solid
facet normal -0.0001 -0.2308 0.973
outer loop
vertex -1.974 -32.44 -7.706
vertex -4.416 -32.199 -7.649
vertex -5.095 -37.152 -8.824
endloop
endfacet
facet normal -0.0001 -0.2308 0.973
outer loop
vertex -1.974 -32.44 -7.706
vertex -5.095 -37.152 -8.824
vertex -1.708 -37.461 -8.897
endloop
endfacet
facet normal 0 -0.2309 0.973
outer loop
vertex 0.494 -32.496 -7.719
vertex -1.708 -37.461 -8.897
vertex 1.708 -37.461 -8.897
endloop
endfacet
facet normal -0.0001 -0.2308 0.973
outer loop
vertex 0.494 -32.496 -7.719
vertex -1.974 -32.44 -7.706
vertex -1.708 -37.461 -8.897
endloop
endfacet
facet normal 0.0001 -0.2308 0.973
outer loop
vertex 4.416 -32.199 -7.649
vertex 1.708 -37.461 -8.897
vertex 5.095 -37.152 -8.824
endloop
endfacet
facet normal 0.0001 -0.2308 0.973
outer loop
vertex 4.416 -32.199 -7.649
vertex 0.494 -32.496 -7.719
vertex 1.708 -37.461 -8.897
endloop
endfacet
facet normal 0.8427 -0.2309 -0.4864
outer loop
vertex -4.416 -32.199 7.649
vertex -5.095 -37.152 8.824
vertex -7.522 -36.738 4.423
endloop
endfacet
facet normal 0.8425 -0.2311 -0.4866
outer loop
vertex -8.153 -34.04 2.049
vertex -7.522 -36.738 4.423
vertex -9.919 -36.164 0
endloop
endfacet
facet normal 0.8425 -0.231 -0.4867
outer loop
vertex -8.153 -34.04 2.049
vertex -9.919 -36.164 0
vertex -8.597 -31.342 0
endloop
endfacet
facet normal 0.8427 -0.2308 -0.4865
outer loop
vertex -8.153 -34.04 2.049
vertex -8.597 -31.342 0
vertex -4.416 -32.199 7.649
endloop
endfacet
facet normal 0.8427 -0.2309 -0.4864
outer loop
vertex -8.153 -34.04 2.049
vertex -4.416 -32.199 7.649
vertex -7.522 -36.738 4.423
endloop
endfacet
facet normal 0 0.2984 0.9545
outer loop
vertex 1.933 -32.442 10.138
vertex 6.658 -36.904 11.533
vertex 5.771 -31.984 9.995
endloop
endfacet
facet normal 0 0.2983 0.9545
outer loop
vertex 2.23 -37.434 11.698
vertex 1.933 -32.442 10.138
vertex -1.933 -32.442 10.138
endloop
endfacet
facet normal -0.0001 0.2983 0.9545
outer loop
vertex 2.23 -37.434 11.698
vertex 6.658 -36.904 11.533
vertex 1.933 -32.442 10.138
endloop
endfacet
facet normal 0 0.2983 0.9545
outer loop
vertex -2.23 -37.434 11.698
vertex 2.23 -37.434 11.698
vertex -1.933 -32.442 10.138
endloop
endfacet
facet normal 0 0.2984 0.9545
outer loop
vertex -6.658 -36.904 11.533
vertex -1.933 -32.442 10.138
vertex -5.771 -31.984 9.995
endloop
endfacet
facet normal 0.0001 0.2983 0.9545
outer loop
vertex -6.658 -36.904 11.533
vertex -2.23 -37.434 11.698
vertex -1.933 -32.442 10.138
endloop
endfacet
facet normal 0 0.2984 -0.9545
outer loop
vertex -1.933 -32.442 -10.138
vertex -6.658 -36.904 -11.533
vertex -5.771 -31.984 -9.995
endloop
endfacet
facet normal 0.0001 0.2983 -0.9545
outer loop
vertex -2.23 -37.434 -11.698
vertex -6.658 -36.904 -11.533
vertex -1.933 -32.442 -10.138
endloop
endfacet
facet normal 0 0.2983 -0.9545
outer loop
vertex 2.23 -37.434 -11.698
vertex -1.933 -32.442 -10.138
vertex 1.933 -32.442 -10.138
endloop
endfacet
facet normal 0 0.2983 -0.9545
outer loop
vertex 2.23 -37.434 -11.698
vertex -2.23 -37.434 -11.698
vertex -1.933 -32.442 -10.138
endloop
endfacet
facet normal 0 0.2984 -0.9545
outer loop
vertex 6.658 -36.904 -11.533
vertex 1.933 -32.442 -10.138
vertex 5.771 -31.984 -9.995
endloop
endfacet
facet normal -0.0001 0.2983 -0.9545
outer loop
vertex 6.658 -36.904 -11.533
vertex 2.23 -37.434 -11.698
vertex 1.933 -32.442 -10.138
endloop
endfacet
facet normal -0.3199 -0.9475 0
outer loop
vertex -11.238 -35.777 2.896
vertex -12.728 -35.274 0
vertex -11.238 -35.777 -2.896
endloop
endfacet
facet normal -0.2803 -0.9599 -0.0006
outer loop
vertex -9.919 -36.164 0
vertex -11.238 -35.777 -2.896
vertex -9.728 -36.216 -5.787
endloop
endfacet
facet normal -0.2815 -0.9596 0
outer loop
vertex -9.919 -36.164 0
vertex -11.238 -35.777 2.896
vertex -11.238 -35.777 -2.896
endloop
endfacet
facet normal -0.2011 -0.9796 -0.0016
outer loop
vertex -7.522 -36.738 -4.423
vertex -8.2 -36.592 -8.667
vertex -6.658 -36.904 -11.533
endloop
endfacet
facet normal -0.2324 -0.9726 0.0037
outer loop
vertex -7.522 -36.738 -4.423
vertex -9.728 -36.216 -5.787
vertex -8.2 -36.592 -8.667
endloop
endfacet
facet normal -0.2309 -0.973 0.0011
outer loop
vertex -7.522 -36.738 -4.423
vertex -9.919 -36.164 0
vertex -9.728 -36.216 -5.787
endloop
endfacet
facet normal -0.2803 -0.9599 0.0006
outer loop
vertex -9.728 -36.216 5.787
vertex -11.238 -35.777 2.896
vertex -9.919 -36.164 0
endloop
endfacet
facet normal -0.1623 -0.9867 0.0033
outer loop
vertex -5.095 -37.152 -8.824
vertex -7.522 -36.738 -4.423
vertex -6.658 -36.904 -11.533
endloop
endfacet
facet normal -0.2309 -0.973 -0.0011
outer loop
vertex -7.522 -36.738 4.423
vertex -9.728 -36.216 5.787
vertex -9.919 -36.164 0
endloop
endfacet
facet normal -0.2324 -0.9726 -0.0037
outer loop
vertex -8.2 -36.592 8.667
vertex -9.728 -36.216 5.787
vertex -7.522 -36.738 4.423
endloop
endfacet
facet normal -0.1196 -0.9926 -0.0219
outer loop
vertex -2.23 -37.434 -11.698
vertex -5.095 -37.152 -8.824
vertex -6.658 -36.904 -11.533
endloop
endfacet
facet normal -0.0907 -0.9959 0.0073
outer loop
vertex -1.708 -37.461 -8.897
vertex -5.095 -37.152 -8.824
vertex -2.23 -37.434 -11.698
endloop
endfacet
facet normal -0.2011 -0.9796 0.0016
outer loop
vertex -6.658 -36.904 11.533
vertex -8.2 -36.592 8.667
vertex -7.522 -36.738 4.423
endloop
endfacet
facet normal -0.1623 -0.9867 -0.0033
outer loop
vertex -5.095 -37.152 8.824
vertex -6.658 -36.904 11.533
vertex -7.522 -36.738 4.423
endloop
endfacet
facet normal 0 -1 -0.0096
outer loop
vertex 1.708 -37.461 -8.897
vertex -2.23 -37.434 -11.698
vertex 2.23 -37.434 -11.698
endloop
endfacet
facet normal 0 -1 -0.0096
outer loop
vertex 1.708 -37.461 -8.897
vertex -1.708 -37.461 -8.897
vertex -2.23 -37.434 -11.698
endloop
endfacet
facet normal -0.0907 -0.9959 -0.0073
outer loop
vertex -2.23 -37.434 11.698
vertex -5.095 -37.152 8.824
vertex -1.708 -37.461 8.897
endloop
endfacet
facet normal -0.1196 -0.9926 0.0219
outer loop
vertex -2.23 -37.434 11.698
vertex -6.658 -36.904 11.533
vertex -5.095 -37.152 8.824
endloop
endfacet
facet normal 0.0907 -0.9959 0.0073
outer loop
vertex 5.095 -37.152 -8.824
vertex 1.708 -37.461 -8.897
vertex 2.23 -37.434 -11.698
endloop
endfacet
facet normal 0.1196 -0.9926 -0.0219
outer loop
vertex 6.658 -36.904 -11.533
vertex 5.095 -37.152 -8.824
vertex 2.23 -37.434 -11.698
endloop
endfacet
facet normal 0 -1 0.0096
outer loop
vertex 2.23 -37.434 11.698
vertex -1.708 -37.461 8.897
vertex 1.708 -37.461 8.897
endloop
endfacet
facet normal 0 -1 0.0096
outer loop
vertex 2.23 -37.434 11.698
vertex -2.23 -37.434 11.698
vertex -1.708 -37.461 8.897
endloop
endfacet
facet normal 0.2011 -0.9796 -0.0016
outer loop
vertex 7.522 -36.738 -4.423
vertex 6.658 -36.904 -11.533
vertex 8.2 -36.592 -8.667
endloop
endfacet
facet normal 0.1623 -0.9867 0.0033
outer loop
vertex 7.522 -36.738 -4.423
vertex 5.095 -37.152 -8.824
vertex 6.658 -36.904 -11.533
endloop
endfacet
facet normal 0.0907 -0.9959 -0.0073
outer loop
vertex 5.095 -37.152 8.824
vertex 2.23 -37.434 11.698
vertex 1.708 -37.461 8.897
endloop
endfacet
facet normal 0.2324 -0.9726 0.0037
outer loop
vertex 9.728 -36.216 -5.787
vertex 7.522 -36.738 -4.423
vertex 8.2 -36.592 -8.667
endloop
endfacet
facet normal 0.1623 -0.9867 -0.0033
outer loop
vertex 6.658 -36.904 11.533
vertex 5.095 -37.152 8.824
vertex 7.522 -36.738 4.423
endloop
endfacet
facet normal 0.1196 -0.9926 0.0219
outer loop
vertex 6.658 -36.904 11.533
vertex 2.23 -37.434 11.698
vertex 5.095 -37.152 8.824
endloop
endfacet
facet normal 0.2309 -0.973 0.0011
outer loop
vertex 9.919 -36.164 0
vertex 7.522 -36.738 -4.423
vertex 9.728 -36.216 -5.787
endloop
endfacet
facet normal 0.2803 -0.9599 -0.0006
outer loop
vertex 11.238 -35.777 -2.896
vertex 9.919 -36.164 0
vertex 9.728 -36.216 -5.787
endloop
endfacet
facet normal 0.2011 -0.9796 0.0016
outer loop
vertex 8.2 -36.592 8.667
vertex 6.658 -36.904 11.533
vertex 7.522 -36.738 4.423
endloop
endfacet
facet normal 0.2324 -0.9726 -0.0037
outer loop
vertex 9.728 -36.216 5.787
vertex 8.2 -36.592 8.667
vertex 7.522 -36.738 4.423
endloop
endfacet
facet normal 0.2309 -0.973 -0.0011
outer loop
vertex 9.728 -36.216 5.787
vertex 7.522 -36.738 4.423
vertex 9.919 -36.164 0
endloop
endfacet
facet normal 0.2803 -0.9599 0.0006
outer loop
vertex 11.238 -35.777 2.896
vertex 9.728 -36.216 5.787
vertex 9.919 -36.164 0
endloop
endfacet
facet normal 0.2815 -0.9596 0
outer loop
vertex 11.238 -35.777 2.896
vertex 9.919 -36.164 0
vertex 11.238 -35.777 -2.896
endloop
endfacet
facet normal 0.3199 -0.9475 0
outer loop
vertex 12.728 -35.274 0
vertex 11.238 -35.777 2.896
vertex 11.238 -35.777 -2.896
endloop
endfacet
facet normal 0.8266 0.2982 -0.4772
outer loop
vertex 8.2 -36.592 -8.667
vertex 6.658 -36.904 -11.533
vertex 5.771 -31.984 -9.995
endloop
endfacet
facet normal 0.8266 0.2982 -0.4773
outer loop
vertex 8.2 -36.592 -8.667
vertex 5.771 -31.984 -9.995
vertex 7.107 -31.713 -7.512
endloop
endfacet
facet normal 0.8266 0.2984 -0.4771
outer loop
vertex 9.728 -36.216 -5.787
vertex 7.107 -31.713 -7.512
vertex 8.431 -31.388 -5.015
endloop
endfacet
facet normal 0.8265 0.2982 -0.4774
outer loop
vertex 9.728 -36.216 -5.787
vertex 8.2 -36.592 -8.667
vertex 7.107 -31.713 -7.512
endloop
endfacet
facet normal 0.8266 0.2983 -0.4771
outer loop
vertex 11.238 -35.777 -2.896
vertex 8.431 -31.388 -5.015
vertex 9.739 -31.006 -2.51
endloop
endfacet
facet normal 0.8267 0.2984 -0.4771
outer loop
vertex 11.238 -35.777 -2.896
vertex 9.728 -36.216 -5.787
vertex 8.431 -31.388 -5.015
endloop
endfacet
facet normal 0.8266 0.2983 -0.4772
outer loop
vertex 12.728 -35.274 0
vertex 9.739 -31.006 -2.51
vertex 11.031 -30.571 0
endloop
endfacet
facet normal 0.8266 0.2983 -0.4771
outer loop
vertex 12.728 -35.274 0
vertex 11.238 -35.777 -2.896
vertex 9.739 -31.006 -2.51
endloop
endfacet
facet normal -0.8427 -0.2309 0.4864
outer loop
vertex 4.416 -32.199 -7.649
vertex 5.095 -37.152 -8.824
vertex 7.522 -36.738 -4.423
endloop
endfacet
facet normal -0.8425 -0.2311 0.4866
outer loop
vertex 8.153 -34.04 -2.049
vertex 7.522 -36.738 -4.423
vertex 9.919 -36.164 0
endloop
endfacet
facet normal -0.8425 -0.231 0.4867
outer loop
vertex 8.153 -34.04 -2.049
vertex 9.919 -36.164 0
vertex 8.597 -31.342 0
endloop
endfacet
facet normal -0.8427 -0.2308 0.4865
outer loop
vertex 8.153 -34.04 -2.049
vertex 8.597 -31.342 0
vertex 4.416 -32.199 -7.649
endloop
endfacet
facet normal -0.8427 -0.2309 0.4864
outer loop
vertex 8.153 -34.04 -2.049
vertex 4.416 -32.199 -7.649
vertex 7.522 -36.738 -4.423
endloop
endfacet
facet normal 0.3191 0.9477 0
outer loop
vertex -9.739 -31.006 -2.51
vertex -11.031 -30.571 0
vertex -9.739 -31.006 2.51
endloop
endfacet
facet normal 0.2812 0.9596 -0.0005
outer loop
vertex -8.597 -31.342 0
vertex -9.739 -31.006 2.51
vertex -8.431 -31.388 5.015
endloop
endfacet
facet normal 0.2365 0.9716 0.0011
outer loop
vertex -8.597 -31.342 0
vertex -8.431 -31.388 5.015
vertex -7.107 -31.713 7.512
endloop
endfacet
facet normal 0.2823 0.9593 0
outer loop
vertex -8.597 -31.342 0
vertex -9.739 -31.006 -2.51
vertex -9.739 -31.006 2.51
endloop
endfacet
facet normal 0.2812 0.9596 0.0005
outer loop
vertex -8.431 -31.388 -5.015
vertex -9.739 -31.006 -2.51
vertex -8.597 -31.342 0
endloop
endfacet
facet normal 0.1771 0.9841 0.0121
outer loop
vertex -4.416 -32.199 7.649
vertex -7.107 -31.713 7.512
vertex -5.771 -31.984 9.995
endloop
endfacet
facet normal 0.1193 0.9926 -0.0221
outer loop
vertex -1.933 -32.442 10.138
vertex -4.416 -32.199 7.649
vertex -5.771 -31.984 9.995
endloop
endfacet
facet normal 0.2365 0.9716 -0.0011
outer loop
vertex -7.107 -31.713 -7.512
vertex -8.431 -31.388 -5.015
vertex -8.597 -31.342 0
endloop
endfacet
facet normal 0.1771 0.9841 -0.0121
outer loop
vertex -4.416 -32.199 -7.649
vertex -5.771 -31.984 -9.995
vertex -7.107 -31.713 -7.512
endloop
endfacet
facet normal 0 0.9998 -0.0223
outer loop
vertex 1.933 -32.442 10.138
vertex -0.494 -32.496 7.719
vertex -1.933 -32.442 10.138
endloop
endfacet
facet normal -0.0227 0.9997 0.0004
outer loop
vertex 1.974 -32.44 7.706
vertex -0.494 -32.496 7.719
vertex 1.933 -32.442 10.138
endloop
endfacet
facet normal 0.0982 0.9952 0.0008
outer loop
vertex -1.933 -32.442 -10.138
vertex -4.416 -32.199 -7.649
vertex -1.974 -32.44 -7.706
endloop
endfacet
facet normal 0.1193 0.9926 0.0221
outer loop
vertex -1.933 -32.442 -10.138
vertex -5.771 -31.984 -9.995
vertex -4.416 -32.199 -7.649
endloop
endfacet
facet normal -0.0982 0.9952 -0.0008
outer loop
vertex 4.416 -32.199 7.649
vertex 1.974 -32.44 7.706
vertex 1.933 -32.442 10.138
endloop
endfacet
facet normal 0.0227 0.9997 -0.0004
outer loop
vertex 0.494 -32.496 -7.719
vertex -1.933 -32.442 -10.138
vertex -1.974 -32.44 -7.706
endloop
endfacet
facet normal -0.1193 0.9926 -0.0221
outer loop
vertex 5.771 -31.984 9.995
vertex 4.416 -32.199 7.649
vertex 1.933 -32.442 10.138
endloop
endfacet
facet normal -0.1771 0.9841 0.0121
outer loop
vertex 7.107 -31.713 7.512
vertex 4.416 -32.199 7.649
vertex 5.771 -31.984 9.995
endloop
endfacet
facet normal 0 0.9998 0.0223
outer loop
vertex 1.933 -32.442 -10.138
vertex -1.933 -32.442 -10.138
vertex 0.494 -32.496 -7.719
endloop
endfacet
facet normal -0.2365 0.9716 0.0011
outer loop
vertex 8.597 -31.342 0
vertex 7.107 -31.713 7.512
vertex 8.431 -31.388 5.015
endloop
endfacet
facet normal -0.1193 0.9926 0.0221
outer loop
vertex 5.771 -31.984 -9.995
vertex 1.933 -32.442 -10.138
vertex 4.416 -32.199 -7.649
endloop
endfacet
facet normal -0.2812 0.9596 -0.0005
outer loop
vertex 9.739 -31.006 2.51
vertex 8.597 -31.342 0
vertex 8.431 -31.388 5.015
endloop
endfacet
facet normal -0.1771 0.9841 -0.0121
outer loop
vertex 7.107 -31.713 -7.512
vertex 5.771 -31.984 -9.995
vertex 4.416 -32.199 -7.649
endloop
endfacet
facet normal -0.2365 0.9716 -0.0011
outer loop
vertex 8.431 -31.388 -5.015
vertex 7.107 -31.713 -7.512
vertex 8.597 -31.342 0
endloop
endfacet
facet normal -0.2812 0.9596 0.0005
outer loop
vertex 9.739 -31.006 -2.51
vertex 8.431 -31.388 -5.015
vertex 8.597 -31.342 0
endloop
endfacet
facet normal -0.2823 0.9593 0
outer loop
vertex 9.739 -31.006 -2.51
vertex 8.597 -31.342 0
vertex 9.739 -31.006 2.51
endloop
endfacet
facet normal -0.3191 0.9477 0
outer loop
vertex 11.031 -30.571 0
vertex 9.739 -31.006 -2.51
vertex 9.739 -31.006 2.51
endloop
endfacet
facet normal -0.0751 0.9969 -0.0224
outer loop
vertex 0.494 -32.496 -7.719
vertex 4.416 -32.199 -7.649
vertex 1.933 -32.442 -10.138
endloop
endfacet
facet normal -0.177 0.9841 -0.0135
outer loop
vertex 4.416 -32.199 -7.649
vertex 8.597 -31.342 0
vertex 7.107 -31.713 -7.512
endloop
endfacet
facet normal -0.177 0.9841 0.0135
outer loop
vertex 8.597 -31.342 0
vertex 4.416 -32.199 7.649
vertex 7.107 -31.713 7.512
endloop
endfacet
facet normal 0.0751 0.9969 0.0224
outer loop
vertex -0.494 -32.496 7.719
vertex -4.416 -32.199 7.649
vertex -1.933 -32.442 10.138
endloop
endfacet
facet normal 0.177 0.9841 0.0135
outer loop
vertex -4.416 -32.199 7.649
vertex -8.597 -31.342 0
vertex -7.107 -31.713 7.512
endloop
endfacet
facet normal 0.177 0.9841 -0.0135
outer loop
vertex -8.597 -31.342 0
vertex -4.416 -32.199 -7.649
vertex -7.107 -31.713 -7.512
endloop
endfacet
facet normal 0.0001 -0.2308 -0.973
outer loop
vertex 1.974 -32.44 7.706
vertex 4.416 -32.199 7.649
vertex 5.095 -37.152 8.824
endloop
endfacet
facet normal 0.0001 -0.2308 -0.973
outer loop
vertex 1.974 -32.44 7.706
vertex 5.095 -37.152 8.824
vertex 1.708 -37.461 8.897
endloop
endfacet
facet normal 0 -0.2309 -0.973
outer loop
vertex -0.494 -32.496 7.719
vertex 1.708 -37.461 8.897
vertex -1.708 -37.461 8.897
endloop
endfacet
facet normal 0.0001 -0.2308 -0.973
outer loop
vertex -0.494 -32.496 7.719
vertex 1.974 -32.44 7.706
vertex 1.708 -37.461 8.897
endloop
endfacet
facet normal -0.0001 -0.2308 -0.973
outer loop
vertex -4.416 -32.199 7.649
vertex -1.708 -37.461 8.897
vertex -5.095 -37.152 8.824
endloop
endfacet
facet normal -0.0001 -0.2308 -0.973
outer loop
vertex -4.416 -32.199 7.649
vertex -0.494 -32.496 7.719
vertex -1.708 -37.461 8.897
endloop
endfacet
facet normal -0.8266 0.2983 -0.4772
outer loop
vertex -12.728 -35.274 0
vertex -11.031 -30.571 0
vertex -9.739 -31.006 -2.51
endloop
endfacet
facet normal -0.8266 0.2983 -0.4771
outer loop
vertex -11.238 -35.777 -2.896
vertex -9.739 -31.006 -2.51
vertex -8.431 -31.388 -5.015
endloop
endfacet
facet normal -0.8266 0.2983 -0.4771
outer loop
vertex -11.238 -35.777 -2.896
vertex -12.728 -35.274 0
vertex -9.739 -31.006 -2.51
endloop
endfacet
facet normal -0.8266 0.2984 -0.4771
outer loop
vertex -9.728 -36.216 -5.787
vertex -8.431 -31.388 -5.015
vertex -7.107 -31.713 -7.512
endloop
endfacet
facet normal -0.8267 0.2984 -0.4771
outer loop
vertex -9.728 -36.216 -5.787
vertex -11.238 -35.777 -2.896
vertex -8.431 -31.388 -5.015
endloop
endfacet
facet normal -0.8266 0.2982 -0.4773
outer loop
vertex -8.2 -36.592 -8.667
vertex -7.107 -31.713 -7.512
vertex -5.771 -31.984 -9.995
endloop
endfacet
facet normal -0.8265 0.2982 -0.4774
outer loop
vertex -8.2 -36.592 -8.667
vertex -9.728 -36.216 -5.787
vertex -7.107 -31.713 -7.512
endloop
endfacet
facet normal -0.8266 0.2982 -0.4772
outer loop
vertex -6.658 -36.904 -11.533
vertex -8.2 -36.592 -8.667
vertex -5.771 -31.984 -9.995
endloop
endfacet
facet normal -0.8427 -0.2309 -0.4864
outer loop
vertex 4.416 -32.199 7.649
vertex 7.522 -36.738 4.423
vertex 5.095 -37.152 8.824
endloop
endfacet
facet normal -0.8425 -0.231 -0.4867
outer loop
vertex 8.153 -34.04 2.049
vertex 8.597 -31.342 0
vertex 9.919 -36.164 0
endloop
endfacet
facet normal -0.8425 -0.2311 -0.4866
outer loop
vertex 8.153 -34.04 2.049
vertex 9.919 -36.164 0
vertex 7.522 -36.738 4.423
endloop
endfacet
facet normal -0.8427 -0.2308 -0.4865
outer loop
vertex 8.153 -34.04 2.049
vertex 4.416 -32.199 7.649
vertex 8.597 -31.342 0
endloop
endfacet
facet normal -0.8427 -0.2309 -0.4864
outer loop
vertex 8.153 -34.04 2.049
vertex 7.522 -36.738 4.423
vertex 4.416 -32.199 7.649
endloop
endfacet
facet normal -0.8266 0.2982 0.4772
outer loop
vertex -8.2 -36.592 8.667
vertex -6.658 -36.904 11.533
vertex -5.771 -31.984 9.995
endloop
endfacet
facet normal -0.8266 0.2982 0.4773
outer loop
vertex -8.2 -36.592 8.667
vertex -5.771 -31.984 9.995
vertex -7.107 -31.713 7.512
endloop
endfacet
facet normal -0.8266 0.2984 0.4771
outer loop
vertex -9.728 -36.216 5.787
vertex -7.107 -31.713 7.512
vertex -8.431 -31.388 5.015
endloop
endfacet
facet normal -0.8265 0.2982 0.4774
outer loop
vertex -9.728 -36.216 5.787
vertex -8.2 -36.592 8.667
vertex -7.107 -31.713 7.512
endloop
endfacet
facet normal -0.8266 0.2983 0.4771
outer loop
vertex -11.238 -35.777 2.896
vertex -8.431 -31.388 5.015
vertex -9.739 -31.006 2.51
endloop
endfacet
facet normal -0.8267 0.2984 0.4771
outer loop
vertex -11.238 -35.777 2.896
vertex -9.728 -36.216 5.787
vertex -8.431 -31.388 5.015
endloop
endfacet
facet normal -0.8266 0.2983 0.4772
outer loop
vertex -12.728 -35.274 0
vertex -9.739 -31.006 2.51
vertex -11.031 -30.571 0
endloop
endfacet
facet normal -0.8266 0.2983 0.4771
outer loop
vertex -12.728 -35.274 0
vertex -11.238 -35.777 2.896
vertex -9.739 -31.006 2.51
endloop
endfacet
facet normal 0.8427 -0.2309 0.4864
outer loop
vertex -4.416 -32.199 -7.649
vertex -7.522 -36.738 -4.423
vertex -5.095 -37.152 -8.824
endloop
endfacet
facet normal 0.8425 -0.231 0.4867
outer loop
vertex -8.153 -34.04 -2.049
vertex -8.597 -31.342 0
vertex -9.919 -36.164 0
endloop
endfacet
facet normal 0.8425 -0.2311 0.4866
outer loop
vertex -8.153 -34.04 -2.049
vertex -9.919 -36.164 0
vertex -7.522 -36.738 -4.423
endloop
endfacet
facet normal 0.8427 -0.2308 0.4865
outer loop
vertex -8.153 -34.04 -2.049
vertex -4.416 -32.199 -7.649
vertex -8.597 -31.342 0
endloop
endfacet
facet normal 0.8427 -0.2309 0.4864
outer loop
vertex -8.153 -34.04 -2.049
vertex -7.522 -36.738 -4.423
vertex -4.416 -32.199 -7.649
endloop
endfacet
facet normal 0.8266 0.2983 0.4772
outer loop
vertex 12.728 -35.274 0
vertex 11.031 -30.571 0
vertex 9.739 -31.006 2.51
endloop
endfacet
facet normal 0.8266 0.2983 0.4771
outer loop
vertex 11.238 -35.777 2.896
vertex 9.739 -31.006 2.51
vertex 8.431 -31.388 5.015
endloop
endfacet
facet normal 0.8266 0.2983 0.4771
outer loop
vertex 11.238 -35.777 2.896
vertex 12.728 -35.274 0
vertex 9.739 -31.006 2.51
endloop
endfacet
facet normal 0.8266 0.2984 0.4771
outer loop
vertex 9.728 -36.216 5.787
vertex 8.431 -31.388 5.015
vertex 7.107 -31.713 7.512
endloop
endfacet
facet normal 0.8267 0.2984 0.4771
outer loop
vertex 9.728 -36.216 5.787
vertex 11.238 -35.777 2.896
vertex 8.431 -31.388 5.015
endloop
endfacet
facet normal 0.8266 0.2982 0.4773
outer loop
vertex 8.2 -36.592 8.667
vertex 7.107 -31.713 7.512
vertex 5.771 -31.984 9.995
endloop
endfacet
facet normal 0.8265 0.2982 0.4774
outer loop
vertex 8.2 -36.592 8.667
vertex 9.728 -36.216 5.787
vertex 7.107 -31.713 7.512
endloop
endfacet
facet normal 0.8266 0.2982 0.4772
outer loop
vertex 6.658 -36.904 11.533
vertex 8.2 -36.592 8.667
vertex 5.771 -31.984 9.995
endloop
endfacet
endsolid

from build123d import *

# Parameters (mm, degrees)
F7_R     = 37.5
F7_R_2   = 32.5
F8_DEPTH = 25


with BuildPart() as f2:
    # F1 (on offset) → F2 section 0
    with BuildSketch(Plane.XZ.offset(40), mode=Mode.PRIVATE) as f2_s0:
        Polygon((-7.2168783649, -12.5), (7.2168783649, -12.5), (14.4337567297, 0), (7.2168783649, 12.5), (-7.2168783649, 12.5), (-14.4337567297, 0), align=None)
    loft([Vertex(0, 0, 0), f2_s0.sketch])

    # F4 (on offset) → F6 section 0
    with BuildSketch(Plane.XZ.offset(40)):
        Polygon((-5.4848275573, -9.5), (5.4848275573, -9.5), (10.9696551146, 0), (5.4848275573, 9.5), (-5.4848275573, 9.5), (-10.9696551146, 0), align=None)
    # F5 (on offset) → F6 section 1
    with BuildSketch(Plane.XZ.offset(0.1)):
        Polygon((0.0180421959, 0.03125), (-0.0180421959, 0.03125), (-0.0360843918, 0), (-0.0180421959, -0.03125), (0.0180421959, -0.03125), (0.0360843918, 0), align=None)
    loft(mode=Mode.SUBTRACT)

    # F7 (on Top) → F8 (intersect, symmetric)
    with BuildSketch(Plane.XY):
        Circle(F7_R)
        Circle(F7_R_2, mode=Mode.SUBTRACT)
    extrude(amount=F8_DEPTH, both=True, mode=Mode.INTERSECT)


solid = f2.part
